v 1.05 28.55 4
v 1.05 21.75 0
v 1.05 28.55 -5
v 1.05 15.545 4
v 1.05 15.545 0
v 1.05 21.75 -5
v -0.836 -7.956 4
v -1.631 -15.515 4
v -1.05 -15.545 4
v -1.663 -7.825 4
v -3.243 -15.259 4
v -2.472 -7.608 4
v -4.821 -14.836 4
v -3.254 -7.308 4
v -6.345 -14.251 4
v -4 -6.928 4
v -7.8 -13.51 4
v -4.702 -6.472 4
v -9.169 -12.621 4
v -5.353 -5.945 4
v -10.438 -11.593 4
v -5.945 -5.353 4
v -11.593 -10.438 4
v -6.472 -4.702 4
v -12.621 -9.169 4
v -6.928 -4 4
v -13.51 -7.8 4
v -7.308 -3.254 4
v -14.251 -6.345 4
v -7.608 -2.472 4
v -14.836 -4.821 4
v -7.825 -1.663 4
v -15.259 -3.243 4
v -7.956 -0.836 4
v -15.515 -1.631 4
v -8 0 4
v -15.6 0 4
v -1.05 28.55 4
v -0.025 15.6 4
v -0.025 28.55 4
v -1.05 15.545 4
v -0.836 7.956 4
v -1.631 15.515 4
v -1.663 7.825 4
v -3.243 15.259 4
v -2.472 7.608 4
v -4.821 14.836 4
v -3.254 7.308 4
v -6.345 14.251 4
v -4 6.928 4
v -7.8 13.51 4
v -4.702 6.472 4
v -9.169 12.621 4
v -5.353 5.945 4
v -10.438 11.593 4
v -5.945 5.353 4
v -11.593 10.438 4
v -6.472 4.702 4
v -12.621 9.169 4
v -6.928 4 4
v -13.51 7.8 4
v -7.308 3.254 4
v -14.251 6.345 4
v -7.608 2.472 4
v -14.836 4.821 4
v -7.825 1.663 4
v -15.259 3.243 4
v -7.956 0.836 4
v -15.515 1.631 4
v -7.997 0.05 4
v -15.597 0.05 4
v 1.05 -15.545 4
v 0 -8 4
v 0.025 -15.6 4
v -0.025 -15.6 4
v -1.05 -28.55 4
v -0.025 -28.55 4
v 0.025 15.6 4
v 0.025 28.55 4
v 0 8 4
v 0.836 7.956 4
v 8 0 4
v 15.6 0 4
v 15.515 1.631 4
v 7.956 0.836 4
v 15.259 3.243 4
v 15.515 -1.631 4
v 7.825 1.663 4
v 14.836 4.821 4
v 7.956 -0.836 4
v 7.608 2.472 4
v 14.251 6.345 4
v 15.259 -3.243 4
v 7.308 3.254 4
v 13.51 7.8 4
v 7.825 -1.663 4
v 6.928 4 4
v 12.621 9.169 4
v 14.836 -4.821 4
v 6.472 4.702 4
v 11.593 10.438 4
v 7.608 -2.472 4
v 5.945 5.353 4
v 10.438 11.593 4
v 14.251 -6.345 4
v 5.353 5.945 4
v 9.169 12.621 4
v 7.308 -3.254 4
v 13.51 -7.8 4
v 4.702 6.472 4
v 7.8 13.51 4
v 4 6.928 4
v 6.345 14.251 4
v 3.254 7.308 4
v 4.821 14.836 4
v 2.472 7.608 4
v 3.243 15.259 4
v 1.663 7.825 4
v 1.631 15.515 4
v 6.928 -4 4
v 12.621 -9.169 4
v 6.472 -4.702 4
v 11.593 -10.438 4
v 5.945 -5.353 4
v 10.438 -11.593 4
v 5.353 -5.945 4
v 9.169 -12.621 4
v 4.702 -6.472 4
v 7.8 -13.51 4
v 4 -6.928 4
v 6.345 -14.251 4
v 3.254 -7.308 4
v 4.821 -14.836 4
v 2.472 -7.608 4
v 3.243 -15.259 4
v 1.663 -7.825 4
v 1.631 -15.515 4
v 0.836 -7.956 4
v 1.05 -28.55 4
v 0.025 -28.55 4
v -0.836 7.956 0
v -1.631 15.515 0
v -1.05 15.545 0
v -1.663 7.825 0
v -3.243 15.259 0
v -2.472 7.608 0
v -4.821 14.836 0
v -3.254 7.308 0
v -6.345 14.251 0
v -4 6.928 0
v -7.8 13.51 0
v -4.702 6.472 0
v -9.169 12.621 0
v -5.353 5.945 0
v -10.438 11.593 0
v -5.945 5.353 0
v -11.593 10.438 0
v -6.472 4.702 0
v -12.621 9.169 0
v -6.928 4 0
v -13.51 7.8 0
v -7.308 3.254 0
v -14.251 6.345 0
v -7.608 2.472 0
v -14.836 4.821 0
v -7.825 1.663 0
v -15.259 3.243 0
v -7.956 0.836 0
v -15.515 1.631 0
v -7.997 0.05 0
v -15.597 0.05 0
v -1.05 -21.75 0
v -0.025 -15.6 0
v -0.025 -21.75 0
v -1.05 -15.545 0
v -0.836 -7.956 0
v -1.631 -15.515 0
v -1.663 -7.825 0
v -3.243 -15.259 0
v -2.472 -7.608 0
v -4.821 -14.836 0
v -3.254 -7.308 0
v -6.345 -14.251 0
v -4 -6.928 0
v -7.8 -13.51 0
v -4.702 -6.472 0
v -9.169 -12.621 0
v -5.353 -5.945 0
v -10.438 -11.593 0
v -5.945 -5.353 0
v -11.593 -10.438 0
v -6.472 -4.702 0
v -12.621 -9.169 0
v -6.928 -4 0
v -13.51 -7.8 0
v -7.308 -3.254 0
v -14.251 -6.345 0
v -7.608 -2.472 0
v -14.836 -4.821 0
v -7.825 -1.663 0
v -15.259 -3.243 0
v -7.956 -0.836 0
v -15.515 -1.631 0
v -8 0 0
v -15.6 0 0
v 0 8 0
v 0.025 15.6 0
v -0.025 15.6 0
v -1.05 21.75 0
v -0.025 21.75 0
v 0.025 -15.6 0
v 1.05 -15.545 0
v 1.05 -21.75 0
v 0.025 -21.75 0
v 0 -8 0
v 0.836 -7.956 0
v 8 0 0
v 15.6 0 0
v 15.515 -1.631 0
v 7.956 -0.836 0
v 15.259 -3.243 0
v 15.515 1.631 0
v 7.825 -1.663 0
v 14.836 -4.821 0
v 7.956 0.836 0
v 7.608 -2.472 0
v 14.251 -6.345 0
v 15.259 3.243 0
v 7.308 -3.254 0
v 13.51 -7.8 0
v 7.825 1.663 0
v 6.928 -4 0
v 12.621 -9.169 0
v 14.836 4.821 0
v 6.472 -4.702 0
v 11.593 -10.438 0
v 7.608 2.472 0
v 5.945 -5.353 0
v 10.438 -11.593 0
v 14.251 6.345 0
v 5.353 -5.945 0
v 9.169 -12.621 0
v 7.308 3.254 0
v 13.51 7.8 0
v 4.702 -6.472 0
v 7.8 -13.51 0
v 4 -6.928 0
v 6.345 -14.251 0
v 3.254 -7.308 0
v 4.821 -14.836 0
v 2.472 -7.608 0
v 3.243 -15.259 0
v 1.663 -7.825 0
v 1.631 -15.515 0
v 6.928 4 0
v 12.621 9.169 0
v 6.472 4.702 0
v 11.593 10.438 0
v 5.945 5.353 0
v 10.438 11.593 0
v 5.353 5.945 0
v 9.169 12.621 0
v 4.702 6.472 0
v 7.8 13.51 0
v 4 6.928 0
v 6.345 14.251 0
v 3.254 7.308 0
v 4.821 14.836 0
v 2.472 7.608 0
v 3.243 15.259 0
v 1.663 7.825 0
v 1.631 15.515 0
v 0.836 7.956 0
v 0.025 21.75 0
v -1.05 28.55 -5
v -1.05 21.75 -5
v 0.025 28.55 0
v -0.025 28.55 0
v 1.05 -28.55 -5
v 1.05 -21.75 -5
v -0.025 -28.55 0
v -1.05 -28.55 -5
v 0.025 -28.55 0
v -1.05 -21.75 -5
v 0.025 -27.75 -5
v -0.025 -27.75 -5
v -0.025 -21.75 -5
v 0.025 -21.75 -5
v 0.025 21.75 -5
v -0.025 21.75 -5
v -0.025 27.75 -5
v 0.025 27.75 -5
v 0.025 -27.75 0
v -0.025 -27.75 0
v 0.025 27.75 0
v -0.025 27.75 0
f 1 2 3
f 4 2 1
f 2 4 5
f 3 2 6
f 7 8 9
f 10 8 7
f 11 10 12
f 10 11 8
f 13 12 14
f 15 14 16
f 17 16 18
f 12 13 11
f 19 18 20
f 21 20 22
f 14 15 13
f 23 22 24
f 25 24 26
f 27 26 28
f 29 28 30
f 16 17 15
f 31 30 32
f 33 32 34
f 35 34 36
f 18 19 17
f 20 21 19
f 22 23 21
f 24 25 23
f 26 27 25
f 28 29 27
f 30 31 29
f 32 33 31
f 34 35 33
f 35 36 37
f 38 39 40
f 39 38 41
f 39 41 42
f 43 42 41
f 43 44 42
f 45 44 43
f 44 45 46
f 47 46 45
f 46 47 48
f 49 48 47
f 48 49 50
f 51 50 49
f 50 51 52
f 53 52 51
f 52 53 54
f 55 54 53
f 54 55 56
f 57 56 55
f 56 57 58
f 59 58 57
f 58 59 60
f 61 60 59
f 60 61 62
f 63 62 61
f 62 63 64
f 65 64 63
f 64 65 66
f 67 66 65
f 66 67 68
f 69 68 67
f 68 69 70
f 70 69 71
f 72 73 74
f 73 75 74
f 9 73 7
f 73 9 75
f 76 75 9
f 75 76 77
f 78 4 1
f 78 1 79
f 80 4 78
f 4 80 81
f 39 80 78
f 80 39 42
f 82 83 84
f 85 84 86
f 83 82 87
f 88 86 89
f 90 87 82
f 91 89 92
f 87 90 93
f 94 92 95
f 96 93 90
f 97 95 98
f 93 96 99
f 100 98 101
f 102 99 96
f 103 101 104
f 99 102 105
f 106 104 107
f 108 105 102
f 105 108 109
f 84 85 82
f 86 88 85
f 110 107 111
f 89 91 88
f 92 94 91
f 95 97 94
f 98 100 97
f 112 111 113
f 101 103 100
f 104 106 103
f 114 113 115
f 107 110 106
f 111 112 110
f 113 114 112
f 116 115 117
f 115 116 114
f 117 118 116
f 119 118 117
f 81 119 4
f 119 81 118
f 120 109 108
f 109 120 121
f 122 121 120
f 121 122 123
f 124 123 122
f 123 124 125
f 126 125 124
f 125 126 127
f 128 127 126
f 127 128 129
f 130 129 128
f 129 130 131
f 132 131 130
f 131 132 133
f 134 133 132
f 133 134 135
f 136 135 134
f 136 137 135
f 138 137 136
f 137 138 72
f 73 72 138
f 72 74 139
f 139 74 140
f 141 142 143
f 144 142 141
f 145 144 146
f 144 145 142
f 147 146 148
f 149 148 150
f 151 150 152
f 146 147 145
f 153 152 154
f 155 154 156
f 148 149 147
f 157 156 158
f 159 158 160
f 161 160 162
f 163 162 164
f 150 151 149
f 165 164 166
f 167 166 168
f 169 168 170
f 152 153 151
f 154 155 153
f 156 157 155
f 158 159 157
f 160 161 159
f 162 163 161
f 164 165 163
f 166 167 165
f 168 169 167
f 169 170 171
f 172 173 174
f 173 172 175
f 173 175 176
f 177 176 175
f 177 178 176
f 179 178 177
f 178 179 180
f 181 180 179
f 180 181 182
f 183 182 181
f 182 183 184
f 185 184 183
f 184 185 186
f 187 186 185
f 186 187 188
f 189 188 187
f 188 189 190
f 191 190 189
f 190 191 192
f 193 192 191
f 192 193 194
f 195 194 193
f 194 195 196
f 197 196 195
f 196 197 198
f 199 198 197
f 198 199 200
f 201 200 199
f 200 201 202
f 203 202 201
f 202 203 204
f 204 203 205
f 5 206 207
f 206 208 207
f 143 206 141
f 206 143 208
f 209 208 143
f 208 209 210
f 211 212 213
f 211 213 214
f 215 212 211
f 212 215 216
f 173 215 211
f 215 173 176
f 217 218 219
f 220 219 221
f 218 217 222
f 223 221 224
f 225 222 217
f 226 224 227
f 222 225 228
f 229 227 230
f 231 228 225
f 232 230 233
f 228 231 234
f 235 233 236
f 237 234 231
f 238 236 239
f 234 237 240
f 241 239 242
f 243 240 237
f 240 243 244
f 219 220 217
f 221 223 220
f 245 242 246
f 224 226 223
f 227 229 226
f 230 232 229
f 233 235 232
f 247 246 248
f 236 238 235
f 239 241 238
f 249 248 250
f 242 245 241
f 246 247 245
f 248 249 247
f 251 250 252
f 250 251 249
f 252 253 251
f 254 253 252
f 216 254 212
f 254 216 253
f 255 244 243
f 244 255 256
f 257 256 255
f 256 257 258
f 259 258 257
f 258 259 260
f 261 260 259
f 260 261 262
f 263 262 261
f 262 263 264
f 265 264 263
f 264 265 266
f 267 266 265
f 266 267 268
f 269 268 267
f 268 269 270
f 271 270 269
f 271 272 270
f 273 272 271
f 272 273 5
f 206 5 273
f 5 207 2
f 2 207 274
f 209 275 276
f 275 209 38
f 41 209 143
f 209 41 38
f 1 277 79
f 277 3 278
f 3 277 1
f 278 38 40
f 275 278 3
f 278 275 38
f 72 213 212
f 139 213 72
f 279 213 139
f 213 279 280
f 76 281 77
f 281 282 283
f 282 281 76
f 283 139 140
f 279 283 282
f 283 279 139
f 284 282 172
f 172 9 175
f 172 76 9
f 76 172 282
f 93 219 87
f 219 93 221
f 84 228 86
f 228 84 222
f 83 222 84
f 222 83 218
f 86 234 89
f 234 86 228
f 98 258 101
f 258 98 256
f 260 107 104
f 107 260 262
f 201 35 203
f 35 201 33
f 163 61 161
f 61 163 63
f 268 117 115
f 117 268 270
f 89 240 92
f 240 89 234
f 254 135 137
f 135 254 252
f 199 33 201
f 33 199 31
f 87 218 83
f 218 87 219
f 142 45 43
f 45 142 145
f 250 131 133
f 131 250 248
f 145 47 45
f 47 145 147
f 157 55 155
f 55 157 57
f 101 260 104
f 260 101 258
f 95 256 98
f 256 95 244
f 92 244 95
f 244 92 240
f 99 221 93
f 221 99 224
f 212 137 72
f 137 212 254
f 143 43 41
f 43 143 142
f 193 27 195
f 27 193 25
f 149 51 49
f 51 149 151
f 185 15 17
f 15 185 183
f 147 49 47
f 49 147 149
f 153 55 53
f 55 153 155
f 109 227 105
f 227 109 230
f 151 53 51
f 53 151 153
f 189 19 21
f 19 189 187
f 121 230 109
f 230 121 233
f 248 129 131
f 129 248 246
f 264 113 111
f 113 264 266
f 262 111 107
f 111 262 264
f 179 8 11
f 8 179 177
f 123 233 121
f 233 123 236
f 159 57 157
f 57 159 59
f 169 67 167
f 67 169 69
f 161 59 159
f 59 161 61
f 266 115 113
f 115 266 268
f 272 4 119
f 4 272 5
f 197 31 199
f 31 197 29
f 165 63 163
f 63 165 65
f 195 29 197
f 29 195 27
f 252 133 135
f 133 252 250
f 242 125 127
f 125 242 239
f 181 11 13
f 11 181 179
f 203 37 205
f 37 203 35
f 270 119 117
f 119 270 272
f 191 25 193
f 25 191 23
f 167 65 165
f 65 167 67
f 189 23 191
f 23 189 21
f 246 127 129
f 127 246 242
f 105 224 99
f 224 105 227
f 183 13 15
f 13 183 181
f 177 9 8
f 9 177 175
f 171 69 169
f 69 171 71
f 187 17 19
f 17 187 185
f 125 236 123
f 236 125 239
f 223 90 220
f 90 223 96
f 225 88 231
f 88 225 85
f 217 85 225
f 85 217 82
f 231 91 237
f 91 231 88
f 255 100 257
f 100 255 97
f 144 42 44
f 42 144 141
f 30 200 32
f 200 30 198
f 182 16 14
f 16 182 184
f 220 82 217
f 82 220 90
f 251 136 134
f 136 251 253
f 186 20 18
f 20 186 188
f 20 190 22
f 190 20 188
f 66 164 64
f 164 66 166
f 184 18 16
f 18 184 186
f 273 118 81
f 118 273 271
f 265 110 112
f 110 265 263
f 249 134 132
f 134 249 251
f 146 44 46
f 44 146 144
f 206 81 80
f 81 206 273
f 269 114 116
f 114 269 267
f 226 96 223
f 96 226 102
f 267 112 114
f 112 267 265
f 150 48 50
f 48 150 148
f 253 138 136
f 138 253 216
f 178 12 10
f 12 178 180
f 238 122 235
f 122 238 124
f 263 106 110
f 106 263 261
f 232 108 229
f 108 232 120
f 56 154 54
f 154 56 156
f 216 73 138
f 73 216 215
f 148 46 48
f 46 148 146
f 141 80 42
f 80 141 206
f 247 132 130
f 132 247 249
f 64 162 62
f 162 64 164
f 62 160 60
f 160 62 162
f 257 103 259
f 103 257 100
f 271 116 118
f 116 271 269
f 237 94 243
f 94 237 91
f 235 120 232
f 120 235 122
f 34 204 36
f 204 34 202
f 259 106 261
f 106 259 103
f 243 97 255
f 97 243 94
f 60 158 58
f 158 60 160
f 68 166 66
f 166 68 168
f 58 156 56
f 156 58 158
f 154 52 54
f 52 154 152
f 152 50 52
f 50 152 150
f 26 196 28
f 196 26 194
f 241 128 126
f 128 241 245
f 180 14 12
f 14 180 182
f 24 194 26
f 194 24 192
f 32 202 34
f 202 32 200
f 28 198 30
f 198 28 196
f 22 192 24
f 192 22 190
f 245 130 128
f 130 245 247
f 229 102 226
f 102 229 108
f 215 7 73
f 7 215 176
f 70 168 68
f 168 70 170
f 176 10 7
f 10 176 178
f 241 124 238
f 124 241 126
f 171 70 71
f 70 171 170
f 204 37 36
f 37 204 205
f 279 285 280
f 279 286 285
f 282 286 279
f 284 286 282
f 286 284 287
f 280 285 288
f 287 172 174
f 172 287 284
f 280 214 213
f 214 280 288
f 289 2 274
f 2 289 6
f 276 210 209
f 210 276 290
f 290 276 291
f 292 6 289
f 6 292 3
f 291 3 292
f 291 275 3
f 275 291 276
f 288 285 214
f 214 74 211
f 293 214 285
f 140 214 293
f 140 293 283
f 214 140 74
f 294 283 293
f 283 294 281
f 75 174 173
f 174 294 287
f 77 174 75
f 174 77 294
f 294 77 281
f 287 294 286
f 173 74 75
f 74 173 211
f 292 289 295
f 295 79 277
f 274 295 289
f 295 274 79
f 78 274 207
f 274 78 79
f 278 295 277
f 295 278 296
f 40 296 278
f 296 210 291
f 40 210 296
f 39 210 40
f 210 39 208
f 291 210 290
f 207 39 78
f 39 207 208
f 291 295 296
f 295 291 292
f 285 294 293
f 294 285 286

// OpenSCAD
// file: screws.scad
// constants
$screw_tolerance = 0.15; // default screw tolerance

// get screw
function get_screw(name) =
  // different screws
  let(screws = [
    // screw name; screw diameter; countersink parameter (head diameter, head depth)
    ["M2", 2, [0, 0]], // FIXME
    ["M2.5", 2.5, [4.6, 1.5]],
    ["4-40", 2.9, [5.3, 4.5]],
    ["M3", 3, [6, 4.5]],
    ["6-32", 3.5, [6.65, 2.11]], // NOTE: countersink dimensions not confirmed
    ["M4", 4, [7.5, 2.5]], // NOTE: counter sink dimensions not confirmed
    ["M5", 5, [10, 6.5]], // NOTE: counter sink dimensions not confirmed
    ["1/4-20", 6.35, [13.50, 4.09]], // NOTE: dimensions from mcmaster carr https://www.mcmaster.com/#92210a537/=1did9kw
    ["10-24", 4.83, [10.44, 3.23]] // NOTE: dimensions from mcmaster carr https://www.mcmaster.com/92210A244/
  ])
  screws[search([name], screws)[0]];

// make a machine screw
// @param name which screw
// @param length how long to make the hole maximally
// @param countersink whether to countersink the screw
// @param invert_countersink whether to countersink the screw at the other end
// @param tolerance what tolerance to add (in mm) to the screw radius
// @param stretch how much to stretch (in mm) the radius in the x direction (to account for collapse in vertical printing), added on top of the tolerance
// @param fn $fn parameter
module machine_screw (name, length, countersink = true, invert_countersink = false, tolerance = $screw_tolerance, stretch = 0, $fn = 30) {
  // parameters
  screw = get_screw(name);
  screw_d = screw[1]; // diameter
  screw_cs = screw[2]; // counter snk
  if (countersink && screw_cs[1] > length) {
    echo("warning - length is shorter than countersink cutout");
  }

  union() {
    resize([screw_d+2*tolerance+2*stretch, 0, 0])
      cylinder(h=length, d=screw_d+2*tolerance, center=false, $fn=$fn);
    if (countersink && invert_countersink) {
      translate([0, 0, length])
        rotate([180, 0, 0])
        resize([screw_cs[0]+2*stretch, 0, 0])
          cylinder(h=screw_cs[1], d1=screw_cs[0], d2=screw_d+2*tolerance, center=false, $fn=$fn);
    } else if (countersink) {
      resize([screw_cs[0]+2*stretch, 0, 0])
        cylinder(h=screw_cs[1], d1=screw_cs[0], d2=screw_d+2*tolerance, center=false, $fn=$fn);
    }
  }
}

// make a threaded machine screw --> uses the https://github.com/JohK/nutsnbolts library
// @param name which screw
// @param length how long to make the hole maximally
// @param countersink whether to countersink the screw
// @render_threads true/false whether to render the threads, set the global $render_threads = true; to turn on globally
module threaded_machine_screw (name, length, countersink = false, render_threads = $render_threads) {
  if (countersink) {
    echo("warning - countersink not yet implemented for threaded machine screws");
    // note: this should be possible with the dimensions from the screws library for head diameter and head height!
  }
  translate([0, 0, length])
  if (render_threads) {
    //hole_threaded(name = name, thread = "modeled", l = length);
  } else {
    //hole_threaded(name = name, thread = "no", l = length);
  }
}

// examples
color("yellow") machine_screw("M3", 5, countersink = false);
color("green") translate([0, 10, 0]) machine_screw("M3", 10);
color("purple") translate([0, 20, 0]) machine_screw("M3", 5, tolerance = 0.5, stretch = 0.5);
color("red") translate([0, -10, 0]) machine_screw("M4", 8);
color("blue") translate([0, -20, 0]) machine_screw("M4", 3, z_plus = 1);



// get hex nut
function get_hexnut(name) =
  // different nuts
  let(nuts = [
    // nut name; nut width (not the radius!); nut thickness
    ["M3", 5.5, 2.4],
    ["M4", 7, 3.2],
    ["M5", 8, 4]
  ])
  nuts[search([name], nuts)[0]];


// make a hexnut
// @param name which hexnut
// @param tolerance what tolerance to add (in mm) to the screw radius
// @param stretch how much to stretch (in mm) the radius in the x direction (to account for collapse in vertical printing), added on top of the tolerance
// @param whether to add a slot for the hexnut (provide in mm total length), default is 0 (i.e. no slot)
// @param z_plus how much thicker to make shape in z (for cutouts)
// @param align whether to align the hexnut to the "bottom" (default), "center" or "top" of the current location (not the bottom)
module hexnut (name, tolerance = 0.025, stretch = 0, slot = 0, z_plus = 0, screw_hole = true, align = "bottom") {
  nut = get_hexnut(name);
  nut_w = nut[1] + 2 * tolerance;
  nut_d = nut_w/cos(180/6); // diameter
  nut_h = nut[2]+2*z_plus; // thickness
  move_z = (align == "top") ? [0, 0, -nut[2]] : ((align == "center") ? [0, 0, -nut[2]/2] : [0, 0, 0]);
  translate([0, 0, -z_plus])
  union() {
    // whether to include a slot for the nut
    if (abs(slot) > 0) {
      translate(move_z)
      translate([-abs(slot)/2 + slot/2, -nut_w/2, 0])
      cube([abs(slot), nut_w, nut_h], center=false);
    }
    // apply stretch to whole nut shape
    resize([nut_d+2*stretch, 0, 0])
      difference() {
        translate(move_z) cylinder(h=nut_h, d=nut_d, center=false, $fn=6);
        if (screw_hole) {
          // generating screw hole with default tolerance
          translate(move_z) machine_screw(name, nut_h, z_plus = 0.1, countersink = false);
        }
      }
  }
}

// examples
color("yellow") translate([10, 0, 0]) hexnut("M3");
color("green") translate([10, 10, 0]) hexnut("M3", z_plus = 0.15);
color("purple") translate([10, 20, 0]) hexnut("M3", 5, tolerance = 0.5, stretch = 1);
color("red") translate([10, -10, 0]) hexnut("M4");
color("blue") translate([10, -20, 0]) hexnut("M4", screw_hole = false);
// main file
use <utils.scad>;
use <screws.scad>;

// constants
$e = 0.01; // small extra for removing artifacts during differencing
$2e = 2 * $e; // twice epsilon for extra length when translating by -e
$fn = $preview ? 10 : 60; // number of default vertices when rendering cylinders
nylon_tol = 0.1; // extra tolerance for carbon fibre nylon parts shrinkage
tglase_tol = 0.025; // extra tolerance for tglase parts

/** device general settings **/

$extra_tolerance = 2 * nylon_tol; // for cutouts, screws, etc.
//$extra_tolerance = 2 * tglase_tol; // for cutouts, screws, etc.
$extra_tolerance_2D = [$extra_tolerance, $extra_tolerance]; // tolerance in 2 d
$screw_hole_tolerance = 0.45 + $extra_tolerance; // tolerance for screw holes
$screw_threadable_tolerance = 0; // tolerance for screw holes that can be threaded into
$screw_vertical_stretch = 0.5; // vertical stretch
$layer_height = 0.25;
$spokes = 0.05; // width of print enhancement spokes
$nozzle = 0.4; // nozzle width for spacing decisions

// holder overall sizes
$holder_inner_diameter = 62; // fix inner diameter for adapter compability
$holder_inner_radius = $holder_inner_diameter/2;
$wall = 4 * $nozzle; // thickness of all walls
$holder_bottom_thickness = 2.5; // thickness of base
$holder_base_height = 14;
$holder_sensors_height = 14;
$holder_total_height = $holder_bottom_thickness + $holder_base_height + $holder_sensors_height;
$holder_feet_screw_type = "6-32"; // what screw type for the feet
$holder_feet_screw_thread_height = 6.35; // 1/4" length
$holder_feet_screw_wall = $wall; // thickness of the wall around the feet threads
$holder_feet_location = [54, 180, 306]; // angle locations
$holder_gap_width = 4; // gap for bottle view
$holder_feet_diameter = get_screw($holder_feet_screw_type)[1] + 2 * $holder_feet_screw_wall;
$holder_vent_diameter = $holder_inner_diameter - 15;
$holder_vent_width = 2.5;
$holder_notch_width = 2.5;
$holder_notch_length = 8;
$holder_notch_position = $holder_vent_diameter/2 + $holder_vent_width/2;

// stirrer
$stirrer_hole_diameter = 29; // diameter of the center hole for the magnetic stirrer (fits the largest stirrer at ~27mm)
$stirrer_screw_type = "M4"; // what type of screw type for stirrer attachment
$stirrer_screw_distance = 52; // distance between the screws
$stirrer_screw_rotation = 135; // how much to rotate (counter clockwise)

// sensor and beam
$block_attachment_screws_diameter = get_screw("M3")[1] - 0.25; // screws diameter
$beam_position_z = 7; // from top
$light_tunnel_height = 4.0; // height of the light tunnel (photodiode area cross section ~ 3.35mm)
$sensor_light_tunnel_width = 2.75; // width of the sensor light tunnel (photodiode area cross section ~ 3.35mm)
$sensor_block_roof = 3 * $layer_height;
$sensor_block_floor = 2 * $layer_height; // 1 layer at the bottom
$sensor_block_roof_min = 1 * $layer_height; // min height of the sloping roof (at outer edge)
$sensor_block_roof_angle = 25; // angle of roof [in degrees]
$sensor_block_screws_x = 13; // +/- from center
$sensor_block_screws_z = [$beam_position_z, 26]; // from top
$sensor_block_depth = 8.5;
$sensor_block_total_depth = $holder_inner_radius + $wall + $sensor_block_depth;
$sensor_block_outer_width = 2 * $sensor_block_screws_x + $spokes + 2 * $wall;
$sensor_block_inner_width = 2 * $sensor_block_screws_x - $spokes - 2 * $wall;
$sensor_columns_width = 11.0; // columns left/right of sensors
$sensor_columns_start = 15.0; // where the columns start
$beam_light_tunnel_width = 0.8; // width of light tunnel (same hight as sensor block)
$beam_block_roof = 3 * $layer_height; // $sensor_block_floor;
$beam_block_roof_min = $sensor_block_roof_min;
$beam_block_roof_angle = $sensor_block_roof_angle;
$beam_block_screws_x = 8; // +/- from center
$beam_block_screws_z = $beam_position_z; // from top
$beam_block_height = 14; // from top
$beam_block_depth = 5;
$beam_block_total_depth = $holder_inner_radius + $wall + $beam_block_depth;
$beam_block_outer_width = 2 * $beam_block_screws_x + $spokes + 2 * $wall;
$beam_block_inner_width = 2 * $beam_block_screws_x - $spokes - 2 * $wall;

// ir temp sensor
$temp_position_z = 17; // from top
$temp_tunnel_diameter = 4.0; // diameter of sensor entrance

/** micrologger device **/

// FIXME: use the spokes distribution functions used in the base adapters
module device(spokes = true) {

  difference() {

    union() {
      // ring
      with_base_magnets(top = $holder_total_height, spokes = spokes)
        cylinder(d = $holder_inner_diameter + 2 * $wall, h = $holder_total_height);

      // feet threads
      for (angle = $holder_feet_location) {
        translate([$holder_inner_radius * cos(angle), $holder_inner_radius * sin(angle), 0])
        rotate([0, 0, 90 + angle])
        translate([0, -$holder_feet_diameter/2 - 1, 0])
        difference() {
          // foot
          union() {
            // thread core
            linear_extrude($holder_bottom_thickness)
              translate([-$holder_feet_diameter/2, 0, 0])
                square([$holder_feet_diameter, $holder_feet_diameter/2]);
            linear_extrude($holder_feet_screw_thread_height)
              circle(d = $holder_feet_diameter);
            // smooth edges to ring for bottom
            linear_extrude($holder_bottom_thickness)
            for (x = [0, 1]) {
              mirror([x, 0, 0])
                translate([$holder_feet_diameter/2, 0, 0])
                  difference() {
                    square($holder_feet_diameter/2);
                    translate([$holder_feet_diameter/2, 0, 0]) circle(d = $holder_feet_diameter);
                  }
            }
          }

          // foot thread hole
          translate([0, 0, -$e])
            cylinder(d = get_screw($holder_feet_screw_type)[1] + $screw_threadable_tolerance, h = $holder_feet_screw_thread_height + $2e);

          // spokes
          if (spokes) {
            translate([-$spokes/2, -$holder_feet_diameter, -$e])
              cube([$spokes, $holder_feet_diameter, $holder_bottom_thickness + $e], center = false);
          }
        }
      }

      // beam block
      rotate([0, 0, 180])
      difference() {
        union() {
            difference() {
              // block
              translate([-$beam_block_outer_width/2, 0, 0])
                cube([$beam_block_outer_width, $beam_block_total_depth, $holder_total_height], center = false);
              // cutout
              translate([-$beam_block_inner_width/2, 0, 0])
                cube([$beam_block_inner_width, $beam_block_total_depth + $e, $holder_total_height - $beam_block_roof], center = false);
              // spokes
              if (spokes) {
                spoke = [$beam_block_outer_width, $spokes, $beam_block_roof - $layer_height];
                translate([-$beam_block_outer_width/2 + $wall/2, $beam_block_total_depth - $beam_block_depth/2, $holder_total_height - $beam_block_roof])
                distribute_along_y(
                  spoke, length = $beam_block_depth, pad_left = 0
                );
                // last layer
                /*
                translate([0, 0, $holder_total_height - $layer_height])
                distribute_along_x(
                  size = [$spokes, $beam_block_total_depth, $layer_height + $e],
                  length = $beam_block_outer_width
                );
                */
              }
              // sloped supports
              rotate([0, -90, 0])
                translate([0, 0, -$beam_block_outer_width/2 - $e])
                linear_extrude($beam_block_outer_width + $2e)
                polygon([
                  [-$e, $holder_total_height - $beam_block_height],
                  [$holder_total_height - $beam_block_height, $beam_block_total_depth + $e],
                  [-$e, $beam_block_total_depth + $e]
                ]);
              // support spokes
              if (spokes) {
                for (x = [-1, 1])
                  translate([-$spokes/2 + x * $beam_block_screws_x, 0, 0])
                    cube([$spokes, $beam_block_total_depth + $2e, $holder_total_height - $beam_block_height], center = false);
              }
            }
            // pcb attachment screw walls
            for (z = $beam_block_screws_z)
              for (x = [-1, 1])
                for (offset = [-1, 1])
                  translate([x * $beam_block_screws_x + offset * $wall, 0, $holder_total_height - z])
                    rotate([-90, 0, 0])
                      resize([0, $block_attachment_screws_diameter + 2 * $screw_threadable_tolerance + 2 * $screw_vertical_stretch, 0])
                        cylinder(d = $block_attachment_screws_diameter + 2 * $screw_threadable_tolerance, h = $beam_block_total_depth);
        }
        // pcb attachment screws
        for (z = $beam_block_screws_z)
          for (x = [-1, 1])
            translate([x * $beam_block_screws_x, -$e, $holder_total_height - z])
                rotate([-90, 0, 0])
                  resize([0, $block_attachment_screws_diameter + 2 * $screw_threadable_tolerance + 2 * $screw_vertical_stretch, 0])
                    cylinder(d = $block_attachment_screws_diameter + 2 * $screw_threadable_tolerance, h = $beam_block_total_depth + $2e);
      }

      // sensor block
      difference() {
          union() {
              difference() {
                // block
                translate([-$sensor_block_outer_width/2, 0, 0])
                  cube([$sensor_block_outer_width, $sensor_block_total_depth, $holder_total_height], center = false);
                // cutouts
                translate([-$sensor_block_inner_width/2, 0, $sensor_block_floor])
                  cube([$sensor_block_inner_width, $sensor_block_total_depth + $e, $holder_total_height - $sensor_block_roof - $sensor_block_floor], center = false);
                // roof spokes
                if (spokes) {
                  translate([-$sensor_block_outer_width/2 + $wall/2, $sensor_block_total_depth - $sensor_block_depth/2, $holder_total_height - $sensor_block_roof])
                  distribute_along_y(
                    size = [$sensor_block_outer_width, $spokes, $sensor_block_roof - $layer_height],
                    length = $sensor_block_depth, pad_left = 0
                  );
                  translate([-$sensor_block_outer_width/2 + $e, ($sensor_block_total_depth - $sensor_block_depth)/2, $holder_total_height - $sensor_block_roof])
                  distribute_along_y(
                    size = [$sensor_block_outer_width + $2e, $spokes, $sensor_block_roof - $layer_height],
                    length = $sensor_block_total_depth - $sensor_block_depth
                  );
                  // last layer
                  /*
                  translate([0, 0, $holder_total_height - $layer_height])
                  distribute_along_x(
                    size = [$spokes, $sensor_block_total_depth, $layer_height + $e],
                    length = $sensor_block_outer_width
                  );
                  */
                }

                /*
                translate([-$sensor_block_outer_width/2, 0, 0])
                  // block
                  cube([$sensor_block_outer_width, $sensor_block_total_depth, $holder_total_height], center = false);
                  // cutout with sloped roof
                  sensor_block_roof_max = tan ($sensor_block_roof_angle) * $sensor_block_total_depth;
                  translate([0, 0, $sensor_block_floor])
                    rotate([0, -90, 0])
                    translate([0, 0, -$sensor_block_inner_width/2])
                    linear_extrude($sensor_block_inner_width)
                    polygon([
                      [0, -$e],
                      [$holder_total_height - sensor_block_roof_max - $sensor_block_roof_min - $sensor_block_floor, - $e],
                      [$holder_total_height - $sensor_block_roof_min - $sensor_block_floor, $sensor_block_total_depth + $e],
                      [0, $sensor_block_total_depth + $e]
                    ]);
                  // roof spokes
                  if (spokes) {
                    n_spokes = round($sensor_block_inner_width/2.0);
                    for (i = [0:1:n_spokes]) {
                      translate([
                          -$sensor_block_inner_width/2 + i * ($sensor_block_inner_width - $spokes)/n_spokes,
                          0,
                          $sensor_block_floor])
                        cube([$spokes, $sensor_block_total_depth + $2e, $holder_total_height - 2 * $sensor_block_floor], center = false);
                    }
                  }
                  */
              }

              // sensor columns
              difference() {
                // block
                translate([-$sensor_columns_width/2 - $wall/2, 0, 0])
                  cube([$sensor_columns_width + $wall, $sensor_block_total_depth, $holder_total_height - $sensor_block_roof], center = false);
                // cutouts
                translate([-$sensor_columns_width/2, 0, $sensor_block_floor])
                  cube([$sensor_columns_width, $sensor_block_total_depth + $e, $holder_total_height - $sensor_block_roof - $sensor_block_floor], center = false);
                // cut out lower part of columns
                rotate([0, -90, 0])
                  translate([0, 0, -$sensor_columns_width/2 - $wall/2 - $e])
                  linear_extrude($sensor_columns_width + $wall + $2e)
                  polygon([
                    [-$e, $holder_inner_radius],
                    [$sensor_columns_start, $sensor_block_total_depth + $e],
                    [-$e, $sensor_block_total_depth + $e]
                  ]);
              }

              // pcb attachment screw walls
              for (z = $sensor_block_screws_z)
                for (x = [-1, 1])
                  for (offset = [-1, 1])
                    translate([x * $sensor_block_screws_x + offset * $wall, 0, $holder_total_height - z])
                      rotate([-90, 0, 0])
                        resize([0, $block_attachment_screws_diameter + 2 * $screw_threadable_tolerance + 2 * $screw_vertical_stretch, 0])
                          cylinder(d = $block_attachment_screws_diameter + 2 * $screw_threadable_tolerance, h = $sensor_block_total_depth);
          }
          // pcb attachment screws
          for (z = $sensor_block_screws_z)
            for (x = [-1, 1])
              translate([x * $sensor_block_screws_x, -$e, $holder_total_height - z])
                  rotate([-90, 0, 0])
                    resize([0, $block_attachment_screws_diameter + 2 * $screw_threadable_tolerance + 2 * $screw_vertical_stretch, 0])
                      cylinder(d = $block_attachment_screws_diameter + 2 * $screw_threadable_tolerance, h = $sensor_block_total_depth + $2e);
      }
    }

    // sensor block beam
    translate([0, $sensor_block_total_depth/2, $holder_total_height - $beam_position_z])
      cube([$sensor_light_tunnel_width, $sensor_block_total_depth, $light_tunnel_height], center = true);

    // beam block beam
    translate([0, -$beam_block_total_depth/2, $holder_total_height - $beam_position_z])
      cube([$beam_light_tunnel_width, $beam_block_total_depth, $light_tunnel_height], center = true);

    // beam block ir sensor
    translate([0, 0, $holder_total_height - $temp_position_z])
      rotate([-90, 0, 0])
        cylinder(d = $temp_tunnel_diameter, h = $sensor_block_total_depth + $e);

    // spokes
    if (spokes) {
      // spokes for sensor block attachment screws
      difference() {
        for (x1 = [-1, 1]) {
          translate([
              -$spokes/2 + x1 * $sensor_block_screws_x,
              0,
              $holder_bottom_thickness])
            cube([$spokes, $sensor_block_total_depth - $wall, $holder_total_height - $holder_bottom_thickness - $sensor_block_floor - $sensor_block_roof], center = false);
        }
        translate([0, $sensor_block_total_depth/2, $holder_total_height - $sensor_block_screws_z[0] - $block_attachment_screws_diameter/2 - $screw_vertical_stretch])
          xy_center_cube([$sensor_block_outer_width, 2 * $sensor_block_total_depth, $block_attachment_screws_diameter + 2 * $screw_vertical_stretch]);
        translate([0, $sensor_block_total_depth/2, $holder_total_height - $sensor_block_screws_z[1] - $block_attachment_screws_diameter/2 - $screw_vertical_stretch])
          xy_center_cube([$sensor_block_outer_width, 2 * $sensor_block_total_depth, $block_attachment_screws_diameter + 2 * $screw_vertical_stretch]);
      }
      // spokes for beam block attachment screws
      rotate([0, 0, 180])
      difference() {
        for (x1 = [-1, 1]) {
          translate([
              -$spokes/2 + x1 * $beam_block_screws_x,
              0,
              $holder_total_height - $beam_block_height])
            cube([$spokes, $beam_block_total_depth - $wall, $beam_block_height - $beam_block_roof], center = false);
        }
        translate([0, $beam_block_total_depth/2, $holder_total_height - $beam_block_screws_z - $block_attachment_screws_diameter/2 - $screw_vertical_stretch])
          xy_center_cube([$beam_block_outer_width, 2 * $beam_block_total_depth, $block_attachment_screws_diameter + 2 * $screw_vertical_stretch]);
      }
      // spokes for stirrer cutout
      translate([$holder_vent_diameter/2, $spokes/2, -$e])
        rotate([0, 0, 180])
          cube([$holder_inner_radius + $holder_vent_diameter/2 + $wall, $spokes, $holder_feet_screw_thread_height + $e], center = false);
      // spokes for motor attachment screws
      rotate([0, 0, $stirrer_screw_rotation])
      translate([0, 0, -$e])
        xy_center_cube([$stirrer_screw_distance, $spokes, $holder_bottom_thickness + $2e]);
      // spokes for tri-supports
      for (angle = $holder_feet_location)
        rotate([0, 0, -90 + angle])
          translate([-$spokes/2, 0, $holder_bottom_thickness])
            cube([$spokes, $holder_inner_radius + $holder_feet_diameter/2, $holder_feet_screw_thread_height - $holder_bottom_thickness + $e], center = false);
    }

    // gap below ir tunnel
    translate([0, -$holder_gap_width/2, $holder_bottom_thickness])
      cube([$holder_inner_radius + $wall + $e, $holder_gap_width, $holder_total_height - $temp_position_z - $temp_tunnel_diameter/2 - $holder_bottom_thickness], center = false);

    // gap between ir tunnel and light tunnel
    translate([0, -$holder_gap_width/2, $holder_total_height - $temp_position_z + $temp_tunnel_diameter/2])
      cube([$holder_inner_radius + $wall + $e, $holder_gap_width, $temp_position_z - $beam_position_z - $temp_tunnel_diameter/2 - $light_tunnel_height/2], center = false);

    // gap from light tunnel to top
    translate([0, -$holder_gap_width/2, $holder_total_height - $beam_position_z + $light_tunnel_height/2])
      cube([$holder_inner_radius + $wall + $e, $holder_gap_width, $holder_total_height - $beam_position_z - $light_tunnel_height/2 + $e], center = false);

    // center cutout
    translate([0, 0, $holder_bottom_thickness])
      cylinder(d = $holder_inner_diameter, h = $holder_total_height);

    // stirrer cutout
    translate([0, 0, -$e])
      cylinder(d = $stirrer_hole_diameter, h = $holder_bottom_thickness + $2e);

    // vent cutouts
    difference() {
      translate([0, 0, -$e])
        cylinder(d = $holder_vent_diameter + 2 * $holder_vent_width, h = $holder_bottom_thickness + $2e);
      translate([0, 0, -$2e])
        cylinder(d = $holder_vent_diameter, h = $holder_bottom_thickness + 2 * $2e);
      for (i = [0, 1])
        translate([(i - 1) * $holder_inner_radius, -i * $holder_inner_radius, -$2e])
          cube([$holder_inner_radius, $holder_inner_radius, $holder_bottom_thickness + 2 * $2e], center = false);
    }

    // notch cutout
    for (y = [-1, 1])
    translate([-$holder_notch_width/2, -$holder_notch_length/2 + y * $holder_notch_position, -$e])
    cube([$holder_notch_width, $holder_notch_length, $holder_bottom_thickness + $2e]);

    // stirrer attachment screws
    for (x = [-1, 1]) {
      translate([x * $stirrer_screw_distance/2 * cos($stirrer_screw_rotation), x * $stirrer_screw_distance/2 * sin($stirrer_screw_rotation), -$e])
        machine_screw($stirrer_screw_type, $holder_bottom_thickness + $2e, invert_countersink = true, tolerance = $screw_hole_tolerance);
    }

  }

}

/** base/adapter attachment magnets **/

// magnet locations
//$magnet_location = [90 + 42, 90 - 42, 270 + 42, 270 - 42];
$magnet_location = [90 + 36, 90 - 36, 270 + 36, 270 - 36];
$magnet_size = [7, 3.25, 7] + [0.25, 0.25, 0.5]; // actual magnet size (depth, width, height) + buffers

// adapter magnets
$magnet_adapter_magnet_base = 2 * $layer_height; // base of adapter
$magnet_adapter_magnet_roof = 2 * $layer_height; // top of adapter
$magnet_adapter_height = $magnet_size[2] + $magnet_adapter_magnet_base + $magnet_adapter_magnet_roof;
$magnet_adapter_width = $magnet_size[1] + 2 * $wall; // 7.5 mm
$magnet_adapter_depth = $holder_inner_radius + 2.5 * $wall + $magnet_size[0];
$magnet_adapter_lip = 2.5; // how far below the rim of the base does the adapter start
$magnet_adapter_min_gap = 1.0; // minimum gap between holder ring and adapter

// adapter ridge ridge
$magnet_base_ridge_depth = $magnet_adapter_depth - $wall - $magnet_size[0];
$magnet_base_ridge_width = $magnet_adapter_width - 2 * $wall;
$magnet_adapter_ridge_depth = $magnet_base_ridge_depth - 0.5;
$magnet_adapter_ridge_width = $magnet_base_ridge_width - 0.75;
$magnet_adapter_connector_width = 2 * $wall;

// base magnets
$magnet_base_magnet_base = 2 * $layer_height; // base of magnet in base
$magnet_base_magnet_roof = 2 * $layer_height; // top of magnet in base
$magnet_base_total_height = $magnet_size[2] + $magnet_base_magnet_base + $magnet_base_magnet_roof;
$magnet_base_width = $magnet_adapter_width;
$magnet_base_depth = $magnet_adapter_depth;

// base holder mangets
// @param top z-coordinate of the top of the magnets
module with_base_magnets(top, spokes = true, ridges = true, last_layer = false) {
  // indices for each magnet holder
  indices = [0:1:(len($magnet_location) - 1)];
  difference() {
    // UNION START
    union() {
      children(0);
      // magnet holder supports
      for (i = indices) {
        rotate([0, 0, -90 + $magnet_location[i]])
          translate([-$magnet_base_width/2, 0, 0])
            // support block
            difference() {
              cube([$magnet_base_width, $magnet_base_depth, top - $magnet_base_total_height], center = false);
              // supports underhang cutout
              translate([$magnet_base_width + $e, 0, -$e])
                rotate([0, -90, 0])
                  linear_extrude($magnet_base_width + $2e)
                  // FIXME: should be calculate based on 45 degree angle instead of guess
                    polygon([
                      [-20, -$e],
                      [-20, $magnet_base_depth + $e],
                      [top - $magnet_base_total_height, $magnet_base_depth + $e],
                      [-20, -$e]
                    ]);
            }
      }
      // magnet chamber
      for (i = indices) {
        rotate([0, 0, -90 + $magnet_location[i]])
          difference() {
            // housing
            translate([-$magnet_base_width/2, 0, top  - $magnet_base_total_height])
              cube([$magnet_base_width, $magnet_base_depth, $magnet_base_total_height], center = false);
            // magnet
            translate([-$magnet_size[1]/2, $magnet_base_depth - $magnet_size[0], top  - $magnet_base_total_height + $magnet_base_magnet_base])
              cube([$magnet_size[1], $magnet_size[0] + $e, $magnet_size[2]], center = false);
          }
      }
    }
    // UNION END

    // DIFFERENCE START
    // ridge cutouts
    if (ridges) {
      for (i = indices) {
        rotate([0, 0, -90 + $magnet_location[i]])
          translate([-$magnet_base_ridge_width/2, 0, top - $magnet_base_total_height + $magnet_base_magnet_base])
            cube([$magnet_base_ridge_width, $magnet_base_ridge_depth, $magnet_base_total_height - $magnet_base_magnet_base + $e], center = false);
      }
    }

    // spokes
    if (spokes) {
      // spokes for magnet holder supports + base
      difference() {
        for (i = indices) {
          rotate([0, 0, -90 + $magnet_location[i]])
            distribute_along_x(
              size = [$spokes, $magnet_base_depth + $e, top  - $magnet_base_total_height + $magnet_base_magnet_base],
              length = $magnet_base_width
            );
        }
        children(0);
      }
      // spokes for magnet roof
      for (i = indices) {
        rotate([0, 0, -90 + $magnet_location[i]]) {
          // lower layers
          translate([-$magnet_base_width/2, $magnet_base_depth - $magnet_size[0], top  - $magnet_base_magnet_roof])
              distribute_along_y(
                size = [$magnet_base_width, $spokes, $magnet_base_magnet_roof - $layer_height],
                length = $magnet_size[0],
                pad_left = 0, align = 0,
                offset = $wall/2, alternate = true
              );
          // last layer
          if (last_layer) {
            translate([0, $magnet_base_depth - $magnet_size[0], top - $layer_height])
                distribute_along_x(
                  size = [$spokes, $magnet_size[0], $layer_height + $e],
                  length = $magnet_adapter_width
                );
          }
        }
      }
    }
    // DIFFERENCE END
  }
}

// adapter magnets
module with_adapter_magnets(inside_diameter = 0, spokes = true, base_insert = true, ridges = true, sensors = false) {
  indices = [0:1:(len($magnet_location) - 1)];
  difference() {
    // UNION START
    union() {
      // main ring
      difference() {
        children(0);
        // minus inner ring above the base
        if (base_insert)
          translate([0, 0, $magnet_adapter_height])
            difference() {
              cylinder(d = 2 * $holder_inner_radius + 2 * $wall + $e, h = 2 * $holder_total_height + $e);
              translate([0, 0, -$e])
                cylinder(d = 2 * $holder_inner_radius - $magnet_adapter_min_gap, h = 2 * $holder_total_height + 3 * $e);
            }
      }
      // magnet holders
      difference() {
        for (i = indices) {
          rotate([0, 0, -90 + $magnet_location[i]])
          // magnet chamber
          difference() {
            union() {
              // magnet chamber
              translate([-$magnet_adapter_width/2, $holder_inner_radius, 0])
                cube([$magnet_adapter_width, $magnet_adapter_depth - $holder_inner_radius, $magnet_adapter_height], center = false);
              // connectors
              translate([-$magnet_adapter_connector_width/2, 0, 0])
                cube([$magnet_adapter_connector_width, $magnet_adapter_depth, $magnet_adapter_height], center = false);
              // ridges
              if (ridges)
                translate([-$magnet_adapter_ridge_width/2, 0, $magnet_adapter_height])
                  cube([$magnet_adapter_ridge_width, $magnet_adapter_ridge_depth, $magnet_adapter_lip], center = false);
              // sensors chambers
              if (sensors) {
                translate([-(2 * $wall + $sensor_setscrew_diameter)/2, 0, 0])
                  cube([2 * $wall + $sensor_setscrew_diameter, inside_diameter/2 + $wall + $sensor_thickness, $sensor_start + $sensor_roof], center = false);
              }
            }
            // spokes
            if (spokes) {
              for (z = [0, $magnet_adapter_height - 2 * $layer_height]) {
                // chamber base spokes (1st layer) - along y axis
                translate([-$magnet_adapter_width/2, $holder_inner_radius, z])
                  distribute_along_y(
                    size = [$magnet_adapter_width, $spokes, $layer_height],
                    length = $magnet_adapter_depth - $holder_inner_radius,
                    align = 0, pad_left = $wall, offset = $wall/2, alternate = true
                  );
                // chamber base spokes (2nd layer) - along x axis
                translate([0, $holder_inner_radius + $wall, z + $layer_height])
                  distribute_along_x(
                    size = [$spokes, $magnet_adapter_depth - $holder_inner_radius - $wall + $e, $layer_height],
                    length = $magnet_adapter_width
                  );
              }
              // connector spokes for base
              translate([-$spokes/2, 0, -$e])
                cube([$spokes, $holder_inner_radius + $wall, $magnet_adapter_magnet_base + $e], center = false);
              // connector spokes between magnet chamber base and roof
              translate([-$spokes/2, 0, $magnet_adapter_magnet_base])
                cube([$spokes, $magnet_adapter_depth, $magnet_size[2]], center = false);
              // connector spokes for roof
              translate([-$spokes/2, 0, $magnet_adapter_magnet_base + $magnet_size[2]])
                cube([$spokes, $holder_inner_radius + $wall, $magnet_adapter_magnet_roof], center = false);
            }
          }
        }
      // clear out interior structures to vial diameter
      translate([0, 0, -$e])
        cylinder(d = inside_diameter, h = $magnet_adapter_height + $magnet_adapter_lip + $2e);
      }
    }
    // UNION END

    // DIFFERENCE START
    // magnet cutouts
    for (i = indices) {
      rotate([0, 0, -90 + $magnet_location[i]])
        translate([-$magnet_size[1]/2, $magnet_adapter_depth - $magnet_size[0], $magnet_adapter_magnet_base])
          cube([$magnet_size[1], $magnet_size[0] + $e, $magnet_size[2]], center = false);
    }

    // hollow ridge if not enough space for a full wall
    if ( ridges && ($holder_inner_diameter - inside_diameter - $nozzle) <= $wall) {
      for (i = indices)
        rotate([0, 0, -90 + $magnet_location[i]])
          translate([-$magnet_adapter_ridge_width/2 + (1.1 * $wall/2)/2, $holder_inner_radius - 1.6 * $wall, $magnet_adapter_height])
            cube([$magnet_adapter_ridge_width - 1.1 * $wall/2, $magnet_adapter_ridge_depth - $wall/4 - $holder_inner_radius + (1.6 - 0.05) * $wall, $magnet_adapter_lip + $e], center = false);
    }

    // sensors
    if (sensors)
      for (i = indices) {
        rotate([0, 0, -90 + $magnet_location[i]]) {
          // sensor holes
          translate([0, 0, $sensor_start])
            rotate([-90, 0, 0])
              cylinder(d = $sensor_cable_diameter, h = inside_diameter/2 + $sensor_thickness + $wall + $e);
          // top screws
          translate([0, inside_diameter/2 + $sensor_thickness - $sensor_setscrew_diameter/2, $sensor_start])
            cylinder(d = $sensor_setscrew_diameter, h = $sensor_roof + $e);
          // sensor spokes
          if (spokes) {
            translate([-$spokes/2, 0, $magnet_adapter_magnet_base + $magnet_size[2] + $magnet_adapter_magnet_roof])
              cube([$spokes, inside_diameter/2 + $sensor_thickness, $sensor_start + $sensor_roof - $magnet_adapter_magnet_base - $magnet_size[2] - $magnet_adapter_magnet_roof], center = false);
          }
        }
      }
    // DIFFERENCE END
  }
}

// crush ribs ring
module crush_ribs_ring(vial_diameter, height) {
  r = vial_diameter/2 + $flex_ribs_depth;
  union() {
    difference() {
      // adapter walls
      cylinder(h = height, d = 2 * r + 2 * $wall);
      // vial cutout
      translate([0, 0, -$e]) cylinder(h = height + $2e, d = 2 * r);
    }
    // flex ribs
    depth = ($flex_ribs_depth^2/2 - $flex_ribs_depth * r + r^2 - r * $flex_ribs_curvature * r) / (r - $flex_ribs_curvature * r);
    for (i = [1:1:$flex_ribs_n]) {
      rotate([0, 0, i * 360/$flex_ribs_n])
      translate([$flex_ribs_width, 0, 0])
      difference() {
        // rib outside
        translate([r - r * $flex_ribs_curvature, 0, 0])
          cylinder(r = r * $flex_ribs_curvature, h = height);
        // rib inside
        translate([r - r * $flex_ribs_curvature, 0, -$e])
          cylinder(r = r * $flex_ribs_curvature - $flex_ribs_width, h = height + $2e);
        // cut away extraneous part of the circle
        translate([-r, -r - $e, -$e])
          cube([r + depth - $flex_ribs_width, 2 * r + $2e, height + $2e], center = false);
        translate([-r, 0, -$e])
          cube([2 * r + $e, r + $e, height + $2e], center = false);
      }
    }
  }
}

/** bottle/vial adapters **/

// bottle adapter sizes
$adapter_gl45_100ml = 56.5 - 2.5; // 100mL media bottle (CONFIRMED)
$adapter_serum_60ml = 41 - 1.25; // 60ml serum bottle (CONFIRMED)
$adapter_serum_120ml = 51.5 - 2.0; // 120ml serium bottles (CONFIRMED)
$adapter_serum_160ml = 54.5 - 2.5; // 160ml serum bottle (CONFIRMED)
$adapter_culture_60ml = 25.4 - 1.0; // 60ml long culture bottle (CONFIRMED)
$adapter_balch = 18.0 - 0.5; // balch and culture tubes (CONFIRMED)
$adapter_hungate = 16.0 - 0.5; // hungate tubes

$sensor_thickness = 6; // thickness of sensor port
$sensor_start = 10; // height of sensor
$sensor_roof = 3; // roof/additional height above sensor location
$sensor_setscrew_diameter = 2.25; // for M2 screw
$sensor_cable_diameter = 3.0; // diameter of the cable

$flex_ribs_n = 8; // number of ribs to use
$flex_ribs_depth = 3; // perpendicular distance from ring wall to tip of ribs
$flex_ribs_curvature = 0.7; // as a fraction of the vial radius
$flex_ribs_width = $nozzle + 0.01; // thickness in mm (doesn't always slice correctly with only 0.5)

// module adapter
module bottle_adapter(vial_diameter, height = $magnet_adapter_height + $magnet_adapter_lip, spokes = true, sensors = false) {
  r = vial_diameter/2 + $flex_ribs_depth;
  with_adapter_magnets(inside_diameter = 2 * r, spokes = spokes, sensors = sensors)
  crush_ribs_ring(vial_diameter, height);
}

/** stirrer magnet holder **/

// stirrers
$stirrer_gear_height = 6.0; // height of the gear teeth
$stirrer_gear_diameter = 11.0 + 2 * $extra_tolerance; // diameter of the teeth
$stirrer_gear_wall = $wall/2; // thickness of the gear wall
$stirrer_gear_teeth_n = 18; // number of teeth
$stirrer_gear_teeth_radius = 0.5; // radius of the teeth attachment
$stirrer_magnet_diameter_small = 6.5 + 2 * $extra_tolerance; // 1/4
$stirrer_magnet_diameter_medium = 8.0 + 2 * $extra_tolerance; // 5/16
$stirrer_magnet_diameter_large = 9.52 + 2 * $extra_tolerance; // 3/8
$stirrer_magnet_height = 3.2; // height of the magnets
$stirrer_magnet_edge_distance = 7.0; // 5.0; // edge-to-edge distance of the magnets
$stirrer_magnet_base = $layer_height; // thickness of base underneath magnet
$stirrer_magnet_wall = $stirrer_gear_wall; // thickness of walls holding the magnets
$stirrer_cuts = 0.1; // print path cuts

// stirrer magnet holder
module stirrer_magnet_holder(stirrer_magnet_diameter) {
  union() {
    difference() {
      // base
      union() {
        // magnet circles
        for (x = [-1, 1])
          translate([x * (stirrer_magnet_diameter/2 + $stirrer_magnet_edge_distance/2), 0, 0])
            cylinder(d = stirrer_magnet_diameter + 2 * $stirrer_magnet_wall, h = $stirrer_magnet_height + $stirrer_magnet_base + $stirrer_gear_height);
        // bridge
        // translate([0, 0, ($stirrer_magnet_height + $stirrer_magnet_base)/2])
        //  cube([stirrer_magnet_diameter + $stirrer_magnet_edge_distance, stirrer_magnet_diameter + 2 * $stirrer_magnet_wall, $stirrer_magnet_height + $stirrer_magnet_base], true);
        // gear adapter
        cylinder(d = $stirrer_gear_diameter + 2 * $stirrer_gear_wall, h = $stirrer_magnet_height + $stirrer_magnet_base + $stirrer_gear_height);
      }
      // magnet cutous
      for (x = [-1, 1])
        translate([x * (stirrer_magnet_diameter/2 + $stirrer_magnet_edge_distance/2), 0, $stirrer_magnet_base])
          cylinder(d = stirrer_magnet_diameter, h = $stirrer_magnet_height + $stirrer_gear_height + $e);
      // bridge cutout
      //translate([0, 0, $stirrer_gear_height/2 + $e + $stirrer_magnet_height + $stirrer_magnet_base])
      //  cube([$stirrer_gear_diameter + 2 * $stirrer_gear_wall + $2e, stirrer_magnet_diameter, $stirrer_gear_height + $2e], true);
      // gear cutout
      translate([0, 0, $stirrer_magnet_base])
        difference() {
          cylinder(d = $stirrer_gear_diameter, h = $stirrer_magnet_height + $stirrer_gear_height + $e);
          for (i = [1:1:$stirrer_gear_teeth_n]) {
            translate([$stirrer_gear_diameter/2 * cos((i-1) * 360/$stirrer_gear_teeth_n), $stirrer_gear_diameter/2 * sin((i-1) * 360/$stirrer_gear_teeth_n), -$e])
              cylinder(r = $stirrer_gear_teeth_radius, h = $stirrer_magnet_height + $stirrer_gear_height + $e + $2e);
          }
        }
    }
    // base rings
    for (x = [-1, 1])
      translate([x * (stirrer_magnet_diameter/2 + $stirrer_magnet_edge_distance/2), 0, $stirrer_magnet_base])
        difference() {
          cylinder(d = stirrer_magnet_diameter + 2 * $stirrer_magnet_wall, h = $stirrer_magnet_height);
          cylinder(d = stirrer_magnet_diameter, h = $stirrer_magnet_height + $e);
          translate([-x * (stirrer_magnet_diameter + $stirrer_magnet_wall)/2, 0, $stirrer_magnet_height/2])
            cube([$stirrer_magnet_wall + $2e, $stirrer_cuts, $stirrer_magnet_height + $2e], center = true);
        }

  }
}

/** utility functions **/

// distribute cube along the x axis
// @param align: where to align relative to x axis - 0 (left aligned, starting at x=0), center = 0.5, 1 (right aligned, ending at x = 0)
// @param offset: offset in the y axis
// @param alternate: whether to alternate offset direction
module distribute_along_x(size, length, spacing = $wall/2, pad_left = $wall/2, pad_right = $wall/2, align = 0.5, offset = 0, alternate = false) {
  length_for_sizes = length - pad_left - pad_right;
  n_sizes = round(length_for_sizes / spacing);
  if (n_sizes > 0) {
    dx = length_for_sizes / n_sizes;
    for (i = [0:1:n_sizes])
      translate([-size[0]/2 - align * length + pad_left + i * dx, offset * ((alternate && i % 2 == 0) ? -1 : 1), 0])
        cube(size, center = false);
  }
}

// distribute cube along the y axis
// @param align: where to align relative to y axis - 0 (left aligned, starting at y=0), center = 0.5, 1 (right aligned, ending at y = 0)
// @param offset: offset in the x axis
// @param alternate: whether to alternate offset direction
module distribute_along_y(size, length, spacing = $wall/2, pad_left = $wall/2, pad_right = $wall/2, align = 0.5, offset = 0, alternate = false) {
  length_for_sizes = length - pad_left - pad_right;
  n_sizes = round(length_for_sizes / spacing);
  if (n_sizes > 0) {
    dy = length_for_sizes / n_sizes;
    for (i = [0:1:n_sizes])
      translate([offset * ((alternate && i % 2 == 0) ? -1 : 1), -size[1]/2 - align * length + pad_left + i * dy, 0])
        cube(size, center = false);
  }
}

/** light adapter **/

$light_adapter_fan_size = 32;
$light_adapter_fan_diameter = 25;
$light_adapter_fan_screw_depth = 2;
$light_adapter_fan_screw_location = 12; // screw locations
$light_adapter_fan_screw_diameter = get_screw("M3")[1] - 0.25;; // screw diameter
$light_adapter_up_diameter = $holder_inner_diameter + 10.5; // account for the light sheet width
$light_adapter_up_height = $light_adapter_fan_size;
$light_adapter_down_diameter = $holder_inner_diameter - 2 * $magnet_adapter_min_gap;
$light_adapter_down_height = $magnet_adapter_height + $holder_base_height + $holder_sensors_height - 2; // down height with a little offset
$light_adapter_gap = 0.25;
$light_adapter_sheet = 2; // gap for wedging light sheet in
$light_adapter_catch = 15; // angle for wedge cutout

module light_adapter_up(height = $light_adapter_up_height, spokes = true) {
  fan_depth = $light_adapter_up_diameter/2 + $light_adapter_fan_screw_depth;
  difference() {
      // cylinder
      with_fan(height, fan_depth, spokes = spokes)
        with_adapter_magnets(base_insert = false, ridges = false)
          cylinder(d = $light_adapter_up_diameter, h = height);
      // core cutout
      translate([0, 0, -$e])
        cylinder(d = $light_adapter_up_diameter - 2 * $wall, h = height + $2e);
  }
}

module light_adapter_down(spokes = true) {
  fan_depth = $holder_inner_radius + $wall + $light_adapter_fan_screw_depth;
  difference() {
    // cylinder
    with_wedge_cutout(dangle = 7, zoffset = $light_adapter_up_height)
      with_fan($light_adapter_up_height, fan_depth, spokes = spokes)
        with_base_magnets($light_adapter_up_height, spokes = spokes, ridges = false, last_layer = true)
          cylinder(d = $light_adapter_down_diameter, h = $light_adapter_down_height + $light_adapter_up_height);
    // core cutout
    translate([0, 0, -$e])
      cylinder(d = $light_adapter_down_diameter - 2 * $wall, h = $light_adapter_down_height + $light_adapter_up_height + $2e);
  }
}

module with_fan(height, fan_depth, spokes = true) {
  difference() {
    union() {
      // light adapter core
      children(0);
      // fan
      difference() {
        // fan adapter
        rotate([0, 0, 90])
          translate([0, -$light_adapter_fan_size/2, 0])
            cube([fan_depth, $light_adapter_fan_size, height], center = false);
        // fan attachment screws
        rotate([0, 0, 90])
          for (y = [-1, 1])
            for (z = [-1, 1])
              translate([0, y * $light_adapter_fan_screw_location, height - $light_adapter_fan_size/2 + z * $light_adapter_fan_screw_location])
                resize([0, 0, $light_adapter_fan_screw_diameter + 2 * $screw_threadable_tolerance + 2 * $screw_vertical_stretch])
                  rotate([0, 90, 0])
                    cylinder(d = $light_adapter_fan_screw_diameter + 2 * $screw_threadable_tolerance, h = $holder_inner_diameter + 4 * $wall + $e);
        // spokes
        if (spokes) {
          rotate([0, 0, 90])
            for (y = [-1, 1])
              translate([0, y * $light_adapter_fan_screw_location, -$e])
                cube([$holder_inner_diameter + 4 * $wall + $e, $spokes, height + $2e]);
        }
      }
    }
    // fan center cutout
    rotate([0, 0, 90])
      translate([0, 0, height - $light_adapter_fan_size/2])
        rotate([0, 90, 0])
          cylinder(d = $light_adapter_fan_diameter, h = fan_depth + $e);
    // fan top cutout
    rotate([0, 0, 90])
      translate([0, -$light_adapter_fan_screw_location + $light_adapter_fan_screw_diameter, height - $light_adapter_fan_size/2])
        cube([fan_depth + $e, 2 * $light_adapter_fan_screw_location - 2 * $light_adapter_fan_screw_diameter, height/2 + $e], center = false);
    // spokes
    if (spokes)
      rotate([0, 0, 90])
        translate([0, 0, -$e])
          cube([fan_depth + $e, $spokes, height + $2e]);
  }
}

module with_wedge_cutout(dangle = 0, zoffset = -$e) {
  echo($magnet_location[2] - $magnet_location[1] + 2 * dangle);
  difference() {
    children(0);
    r = 2 * $magnet_adapter_depth;
    translate([0, 0, zoffset])
      difference() {
        cylinder(d = 2 * r, h = $light_adapter_down_height + $2e);
        for (x = [0, 1])
          rotate([0, 0, x * 180])
            translate([0, 0, -$e])
              linear_extrude($light_adapter_down_height + 3 * $e)
                polygon([
                  [0, 0],
                  [r * cos($magnet_location[1] - dangle), r * sin($magnet_location[1] - dangle)],
                  [r * cos($magnet_location[2] + dangle), r * sin($magnet_location[2] + dangle)],
                ]);
      }
  }
}

/** bottle base **/

$bottle_base_thickness = 4.0; // thickness of bottle adapter base
$bottle_base_expand = 1.15; // expanding for tight fit
$bottle_base_gap = 2; // gap to edge (in mm)
$bottle_clip_position = 0.8 * $holder_inner_diameter; // position of clip
$bottle_clip_stretch = 5; // y stretch of clip
$bottle_base_center_diameter = 16; // the hole in the center
$bottle_base_outer_diameter = 28; // the outside diameter
$bottle_base_notch_gap = $nozzle;

// make the botte base adapter
module bottle_base(spokes = true, inner_diameter = $bottle_base_center_diameter, outer_diameter = $bottle_base_outer_diameter + 2 * $wall, height = $bottle_base_thickness, notch_thickness = 2 * $holder_bottom_thickness) {
  connector = $holder_notch_position + $holder_notch_length/2 - outer_diameter/2 + $wall/2 - $bottle_base_notch_gap/2;
  difference() {
    union() {
      // center
      difference() {
        union() {
          cylinder(d = outer_diameter, h = height);
          // connectors
          for (a = [0, 180])
            rotate([0, 0, a])
              translate([-($holder_notch_width - $bottle_base_notch_gap)/2, -connector + $holder_notch_position + $holder_notch_length/2 - $bottle_base_notch_gap/2, 0])
                cube([$holder_notch_width - $bottle_base_notch_gap, connector, height]);
        }
        translate([0, 0, -$e])
          cylinder(d = inner_diameter , h = height + $2e);
        // spokes
        if (spokes) {
          rotate([0, 0, 90])
            translate([0, 0, -$e])
              cube([$spokes, outer_diameter/2 + $e, height + $2e]);
        }
      }
      // notches
      for (a = [0, 180])
        rotate([0, 0, a])
          translate([-($holder_notch_width - $bottle_base_notch_gap)/2, -$holder_notch_length/2 + $bottle_base_notch_gap/2 - $holder_notch_position, -notch_thickness])
            cube([$holder_notch_width - $bottle_base_notch_gap, $holder_notch_length - 3 * $bottle_base_notch_gap, notch_thickness]);
    }
    // spokes
    if (spokes) {
      for (y = [-1, 1])
        translate([-$spokes/2, -(connector - $wall/2)/2 + y * ($holder_notch_position + $holder_notch_length/2 - $bottle_base_notch_gap/2 - connector/2 + $wall/4), 0])
          cube([$spokes, connector - $wall/2, height + $e]);
      for (a = [0, 180])
        rotate([0, 0, a])
          translate([-$spokes/2, outer_diameter/2, -notch_thickness - $e])
            cube([$spokes, connector - $wall, notch_thickness + $e]);
    }

  }
}

/** standard prints **/

//device();
//stirrer_magnet_holder($stirrer_magnet_diameter_medium);
bottle_base();
//bottle_adapter($adapter_hungate);
//bottle_adapter($adapter_balch);
//bottle_adapter($adapter_gl45_100ml);
//bottle_adapter($adapter_serum_160ml);
//bottle_adapter($adapter_serum_120ml);
//bottle_adapter($adapter_serum_60ml);
//bottle_adapter($adapter_culture_60ml);
//light_adapter_down();
//light_adapter_up();

/** speciality parts - 60mL culture tube base anchor for motor free use (i.e. tube supported only) **/
// union() {
//   bottle_base(inner_diameter = $adapter_culture_60ml + 2 * $wall + 2 * $bottle_base_gap, outer_diameter = $adapter_culture_60ml + 2 * $wall + 2 * $bottle_base_gap, height = $holder_base_height );
//   crush_ribs_ring(vial_diameter = $adapter_culture_60ml, height = $holder_base_height);
// }
